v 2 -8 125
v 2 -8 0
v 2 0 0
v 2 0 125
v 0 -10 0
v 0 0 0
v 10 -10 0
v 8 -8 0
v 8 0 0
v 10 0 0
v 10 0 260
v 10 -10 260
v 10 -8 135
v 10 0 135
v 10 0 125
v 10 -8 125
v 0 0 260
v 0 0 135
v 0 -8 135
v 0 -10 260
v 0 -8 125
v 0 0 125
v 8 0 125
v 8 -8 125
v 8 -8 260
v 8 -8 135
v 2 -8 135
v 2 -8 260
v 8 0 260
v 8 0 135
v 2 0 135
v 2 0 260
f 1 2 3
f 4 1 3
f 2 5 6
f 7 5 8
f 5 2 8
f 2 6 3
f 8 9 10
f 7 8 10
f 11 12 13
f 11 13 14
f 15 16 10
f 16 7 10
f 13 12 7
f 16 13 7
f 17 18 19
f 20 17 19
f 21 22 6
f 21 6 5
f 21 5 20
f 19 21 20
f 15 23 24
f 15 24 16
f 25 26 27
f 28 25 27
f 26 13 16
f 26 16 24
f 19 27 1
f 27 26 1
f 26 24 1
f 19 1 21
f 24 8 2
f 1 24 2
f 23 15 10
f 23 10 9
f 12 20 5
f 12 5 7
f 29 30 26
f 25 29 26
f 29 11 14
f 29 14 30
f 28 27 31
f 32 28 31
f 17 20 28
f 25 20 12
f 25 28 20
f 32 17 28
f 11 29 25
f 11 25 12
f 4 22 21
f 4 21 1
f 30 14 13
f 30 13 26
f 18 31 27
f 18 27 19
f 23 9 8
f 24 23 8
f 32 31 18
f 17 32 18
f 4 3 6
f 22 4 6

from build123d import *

# Parameters (mm, degrees)
BOSS_EXTRU_1_DEPTH      = 260
ENL_V_MAT_EXTRU_1_DEPTH = 8


with BuildPart() as part:
    # Esquisse1 → Boss.-Extru.1 (new body)
    with BuildSketch(Plane.XY):
        Polygon((0, 0), (0, -10), (10, -10), (10, 0), (8, 0), (8, -8), (2, -8), (2, 0), align=None)
    extrude(amount=BOSS_EXTRU_1_DEPTH)

    # Esquisse2 → Enlèv. mat.-Extru.1 (cut)
    with BuildSketch(Plane(origin=(0, 0, 0), x_dir=(1, 0, 0), z_dir=(0, 1, 0))):
        Polygon((-8.996226047, -125), (31.208128552, -125), (31.208128552, -127.984639705), (31.208128552, -135), (-8.996226047, -135), align=None)
    extrude(amount=-ENL_V_MAT_EXTRU_1_DEPTH, mode=Mode.SUBTRACT)


solid = part.part
